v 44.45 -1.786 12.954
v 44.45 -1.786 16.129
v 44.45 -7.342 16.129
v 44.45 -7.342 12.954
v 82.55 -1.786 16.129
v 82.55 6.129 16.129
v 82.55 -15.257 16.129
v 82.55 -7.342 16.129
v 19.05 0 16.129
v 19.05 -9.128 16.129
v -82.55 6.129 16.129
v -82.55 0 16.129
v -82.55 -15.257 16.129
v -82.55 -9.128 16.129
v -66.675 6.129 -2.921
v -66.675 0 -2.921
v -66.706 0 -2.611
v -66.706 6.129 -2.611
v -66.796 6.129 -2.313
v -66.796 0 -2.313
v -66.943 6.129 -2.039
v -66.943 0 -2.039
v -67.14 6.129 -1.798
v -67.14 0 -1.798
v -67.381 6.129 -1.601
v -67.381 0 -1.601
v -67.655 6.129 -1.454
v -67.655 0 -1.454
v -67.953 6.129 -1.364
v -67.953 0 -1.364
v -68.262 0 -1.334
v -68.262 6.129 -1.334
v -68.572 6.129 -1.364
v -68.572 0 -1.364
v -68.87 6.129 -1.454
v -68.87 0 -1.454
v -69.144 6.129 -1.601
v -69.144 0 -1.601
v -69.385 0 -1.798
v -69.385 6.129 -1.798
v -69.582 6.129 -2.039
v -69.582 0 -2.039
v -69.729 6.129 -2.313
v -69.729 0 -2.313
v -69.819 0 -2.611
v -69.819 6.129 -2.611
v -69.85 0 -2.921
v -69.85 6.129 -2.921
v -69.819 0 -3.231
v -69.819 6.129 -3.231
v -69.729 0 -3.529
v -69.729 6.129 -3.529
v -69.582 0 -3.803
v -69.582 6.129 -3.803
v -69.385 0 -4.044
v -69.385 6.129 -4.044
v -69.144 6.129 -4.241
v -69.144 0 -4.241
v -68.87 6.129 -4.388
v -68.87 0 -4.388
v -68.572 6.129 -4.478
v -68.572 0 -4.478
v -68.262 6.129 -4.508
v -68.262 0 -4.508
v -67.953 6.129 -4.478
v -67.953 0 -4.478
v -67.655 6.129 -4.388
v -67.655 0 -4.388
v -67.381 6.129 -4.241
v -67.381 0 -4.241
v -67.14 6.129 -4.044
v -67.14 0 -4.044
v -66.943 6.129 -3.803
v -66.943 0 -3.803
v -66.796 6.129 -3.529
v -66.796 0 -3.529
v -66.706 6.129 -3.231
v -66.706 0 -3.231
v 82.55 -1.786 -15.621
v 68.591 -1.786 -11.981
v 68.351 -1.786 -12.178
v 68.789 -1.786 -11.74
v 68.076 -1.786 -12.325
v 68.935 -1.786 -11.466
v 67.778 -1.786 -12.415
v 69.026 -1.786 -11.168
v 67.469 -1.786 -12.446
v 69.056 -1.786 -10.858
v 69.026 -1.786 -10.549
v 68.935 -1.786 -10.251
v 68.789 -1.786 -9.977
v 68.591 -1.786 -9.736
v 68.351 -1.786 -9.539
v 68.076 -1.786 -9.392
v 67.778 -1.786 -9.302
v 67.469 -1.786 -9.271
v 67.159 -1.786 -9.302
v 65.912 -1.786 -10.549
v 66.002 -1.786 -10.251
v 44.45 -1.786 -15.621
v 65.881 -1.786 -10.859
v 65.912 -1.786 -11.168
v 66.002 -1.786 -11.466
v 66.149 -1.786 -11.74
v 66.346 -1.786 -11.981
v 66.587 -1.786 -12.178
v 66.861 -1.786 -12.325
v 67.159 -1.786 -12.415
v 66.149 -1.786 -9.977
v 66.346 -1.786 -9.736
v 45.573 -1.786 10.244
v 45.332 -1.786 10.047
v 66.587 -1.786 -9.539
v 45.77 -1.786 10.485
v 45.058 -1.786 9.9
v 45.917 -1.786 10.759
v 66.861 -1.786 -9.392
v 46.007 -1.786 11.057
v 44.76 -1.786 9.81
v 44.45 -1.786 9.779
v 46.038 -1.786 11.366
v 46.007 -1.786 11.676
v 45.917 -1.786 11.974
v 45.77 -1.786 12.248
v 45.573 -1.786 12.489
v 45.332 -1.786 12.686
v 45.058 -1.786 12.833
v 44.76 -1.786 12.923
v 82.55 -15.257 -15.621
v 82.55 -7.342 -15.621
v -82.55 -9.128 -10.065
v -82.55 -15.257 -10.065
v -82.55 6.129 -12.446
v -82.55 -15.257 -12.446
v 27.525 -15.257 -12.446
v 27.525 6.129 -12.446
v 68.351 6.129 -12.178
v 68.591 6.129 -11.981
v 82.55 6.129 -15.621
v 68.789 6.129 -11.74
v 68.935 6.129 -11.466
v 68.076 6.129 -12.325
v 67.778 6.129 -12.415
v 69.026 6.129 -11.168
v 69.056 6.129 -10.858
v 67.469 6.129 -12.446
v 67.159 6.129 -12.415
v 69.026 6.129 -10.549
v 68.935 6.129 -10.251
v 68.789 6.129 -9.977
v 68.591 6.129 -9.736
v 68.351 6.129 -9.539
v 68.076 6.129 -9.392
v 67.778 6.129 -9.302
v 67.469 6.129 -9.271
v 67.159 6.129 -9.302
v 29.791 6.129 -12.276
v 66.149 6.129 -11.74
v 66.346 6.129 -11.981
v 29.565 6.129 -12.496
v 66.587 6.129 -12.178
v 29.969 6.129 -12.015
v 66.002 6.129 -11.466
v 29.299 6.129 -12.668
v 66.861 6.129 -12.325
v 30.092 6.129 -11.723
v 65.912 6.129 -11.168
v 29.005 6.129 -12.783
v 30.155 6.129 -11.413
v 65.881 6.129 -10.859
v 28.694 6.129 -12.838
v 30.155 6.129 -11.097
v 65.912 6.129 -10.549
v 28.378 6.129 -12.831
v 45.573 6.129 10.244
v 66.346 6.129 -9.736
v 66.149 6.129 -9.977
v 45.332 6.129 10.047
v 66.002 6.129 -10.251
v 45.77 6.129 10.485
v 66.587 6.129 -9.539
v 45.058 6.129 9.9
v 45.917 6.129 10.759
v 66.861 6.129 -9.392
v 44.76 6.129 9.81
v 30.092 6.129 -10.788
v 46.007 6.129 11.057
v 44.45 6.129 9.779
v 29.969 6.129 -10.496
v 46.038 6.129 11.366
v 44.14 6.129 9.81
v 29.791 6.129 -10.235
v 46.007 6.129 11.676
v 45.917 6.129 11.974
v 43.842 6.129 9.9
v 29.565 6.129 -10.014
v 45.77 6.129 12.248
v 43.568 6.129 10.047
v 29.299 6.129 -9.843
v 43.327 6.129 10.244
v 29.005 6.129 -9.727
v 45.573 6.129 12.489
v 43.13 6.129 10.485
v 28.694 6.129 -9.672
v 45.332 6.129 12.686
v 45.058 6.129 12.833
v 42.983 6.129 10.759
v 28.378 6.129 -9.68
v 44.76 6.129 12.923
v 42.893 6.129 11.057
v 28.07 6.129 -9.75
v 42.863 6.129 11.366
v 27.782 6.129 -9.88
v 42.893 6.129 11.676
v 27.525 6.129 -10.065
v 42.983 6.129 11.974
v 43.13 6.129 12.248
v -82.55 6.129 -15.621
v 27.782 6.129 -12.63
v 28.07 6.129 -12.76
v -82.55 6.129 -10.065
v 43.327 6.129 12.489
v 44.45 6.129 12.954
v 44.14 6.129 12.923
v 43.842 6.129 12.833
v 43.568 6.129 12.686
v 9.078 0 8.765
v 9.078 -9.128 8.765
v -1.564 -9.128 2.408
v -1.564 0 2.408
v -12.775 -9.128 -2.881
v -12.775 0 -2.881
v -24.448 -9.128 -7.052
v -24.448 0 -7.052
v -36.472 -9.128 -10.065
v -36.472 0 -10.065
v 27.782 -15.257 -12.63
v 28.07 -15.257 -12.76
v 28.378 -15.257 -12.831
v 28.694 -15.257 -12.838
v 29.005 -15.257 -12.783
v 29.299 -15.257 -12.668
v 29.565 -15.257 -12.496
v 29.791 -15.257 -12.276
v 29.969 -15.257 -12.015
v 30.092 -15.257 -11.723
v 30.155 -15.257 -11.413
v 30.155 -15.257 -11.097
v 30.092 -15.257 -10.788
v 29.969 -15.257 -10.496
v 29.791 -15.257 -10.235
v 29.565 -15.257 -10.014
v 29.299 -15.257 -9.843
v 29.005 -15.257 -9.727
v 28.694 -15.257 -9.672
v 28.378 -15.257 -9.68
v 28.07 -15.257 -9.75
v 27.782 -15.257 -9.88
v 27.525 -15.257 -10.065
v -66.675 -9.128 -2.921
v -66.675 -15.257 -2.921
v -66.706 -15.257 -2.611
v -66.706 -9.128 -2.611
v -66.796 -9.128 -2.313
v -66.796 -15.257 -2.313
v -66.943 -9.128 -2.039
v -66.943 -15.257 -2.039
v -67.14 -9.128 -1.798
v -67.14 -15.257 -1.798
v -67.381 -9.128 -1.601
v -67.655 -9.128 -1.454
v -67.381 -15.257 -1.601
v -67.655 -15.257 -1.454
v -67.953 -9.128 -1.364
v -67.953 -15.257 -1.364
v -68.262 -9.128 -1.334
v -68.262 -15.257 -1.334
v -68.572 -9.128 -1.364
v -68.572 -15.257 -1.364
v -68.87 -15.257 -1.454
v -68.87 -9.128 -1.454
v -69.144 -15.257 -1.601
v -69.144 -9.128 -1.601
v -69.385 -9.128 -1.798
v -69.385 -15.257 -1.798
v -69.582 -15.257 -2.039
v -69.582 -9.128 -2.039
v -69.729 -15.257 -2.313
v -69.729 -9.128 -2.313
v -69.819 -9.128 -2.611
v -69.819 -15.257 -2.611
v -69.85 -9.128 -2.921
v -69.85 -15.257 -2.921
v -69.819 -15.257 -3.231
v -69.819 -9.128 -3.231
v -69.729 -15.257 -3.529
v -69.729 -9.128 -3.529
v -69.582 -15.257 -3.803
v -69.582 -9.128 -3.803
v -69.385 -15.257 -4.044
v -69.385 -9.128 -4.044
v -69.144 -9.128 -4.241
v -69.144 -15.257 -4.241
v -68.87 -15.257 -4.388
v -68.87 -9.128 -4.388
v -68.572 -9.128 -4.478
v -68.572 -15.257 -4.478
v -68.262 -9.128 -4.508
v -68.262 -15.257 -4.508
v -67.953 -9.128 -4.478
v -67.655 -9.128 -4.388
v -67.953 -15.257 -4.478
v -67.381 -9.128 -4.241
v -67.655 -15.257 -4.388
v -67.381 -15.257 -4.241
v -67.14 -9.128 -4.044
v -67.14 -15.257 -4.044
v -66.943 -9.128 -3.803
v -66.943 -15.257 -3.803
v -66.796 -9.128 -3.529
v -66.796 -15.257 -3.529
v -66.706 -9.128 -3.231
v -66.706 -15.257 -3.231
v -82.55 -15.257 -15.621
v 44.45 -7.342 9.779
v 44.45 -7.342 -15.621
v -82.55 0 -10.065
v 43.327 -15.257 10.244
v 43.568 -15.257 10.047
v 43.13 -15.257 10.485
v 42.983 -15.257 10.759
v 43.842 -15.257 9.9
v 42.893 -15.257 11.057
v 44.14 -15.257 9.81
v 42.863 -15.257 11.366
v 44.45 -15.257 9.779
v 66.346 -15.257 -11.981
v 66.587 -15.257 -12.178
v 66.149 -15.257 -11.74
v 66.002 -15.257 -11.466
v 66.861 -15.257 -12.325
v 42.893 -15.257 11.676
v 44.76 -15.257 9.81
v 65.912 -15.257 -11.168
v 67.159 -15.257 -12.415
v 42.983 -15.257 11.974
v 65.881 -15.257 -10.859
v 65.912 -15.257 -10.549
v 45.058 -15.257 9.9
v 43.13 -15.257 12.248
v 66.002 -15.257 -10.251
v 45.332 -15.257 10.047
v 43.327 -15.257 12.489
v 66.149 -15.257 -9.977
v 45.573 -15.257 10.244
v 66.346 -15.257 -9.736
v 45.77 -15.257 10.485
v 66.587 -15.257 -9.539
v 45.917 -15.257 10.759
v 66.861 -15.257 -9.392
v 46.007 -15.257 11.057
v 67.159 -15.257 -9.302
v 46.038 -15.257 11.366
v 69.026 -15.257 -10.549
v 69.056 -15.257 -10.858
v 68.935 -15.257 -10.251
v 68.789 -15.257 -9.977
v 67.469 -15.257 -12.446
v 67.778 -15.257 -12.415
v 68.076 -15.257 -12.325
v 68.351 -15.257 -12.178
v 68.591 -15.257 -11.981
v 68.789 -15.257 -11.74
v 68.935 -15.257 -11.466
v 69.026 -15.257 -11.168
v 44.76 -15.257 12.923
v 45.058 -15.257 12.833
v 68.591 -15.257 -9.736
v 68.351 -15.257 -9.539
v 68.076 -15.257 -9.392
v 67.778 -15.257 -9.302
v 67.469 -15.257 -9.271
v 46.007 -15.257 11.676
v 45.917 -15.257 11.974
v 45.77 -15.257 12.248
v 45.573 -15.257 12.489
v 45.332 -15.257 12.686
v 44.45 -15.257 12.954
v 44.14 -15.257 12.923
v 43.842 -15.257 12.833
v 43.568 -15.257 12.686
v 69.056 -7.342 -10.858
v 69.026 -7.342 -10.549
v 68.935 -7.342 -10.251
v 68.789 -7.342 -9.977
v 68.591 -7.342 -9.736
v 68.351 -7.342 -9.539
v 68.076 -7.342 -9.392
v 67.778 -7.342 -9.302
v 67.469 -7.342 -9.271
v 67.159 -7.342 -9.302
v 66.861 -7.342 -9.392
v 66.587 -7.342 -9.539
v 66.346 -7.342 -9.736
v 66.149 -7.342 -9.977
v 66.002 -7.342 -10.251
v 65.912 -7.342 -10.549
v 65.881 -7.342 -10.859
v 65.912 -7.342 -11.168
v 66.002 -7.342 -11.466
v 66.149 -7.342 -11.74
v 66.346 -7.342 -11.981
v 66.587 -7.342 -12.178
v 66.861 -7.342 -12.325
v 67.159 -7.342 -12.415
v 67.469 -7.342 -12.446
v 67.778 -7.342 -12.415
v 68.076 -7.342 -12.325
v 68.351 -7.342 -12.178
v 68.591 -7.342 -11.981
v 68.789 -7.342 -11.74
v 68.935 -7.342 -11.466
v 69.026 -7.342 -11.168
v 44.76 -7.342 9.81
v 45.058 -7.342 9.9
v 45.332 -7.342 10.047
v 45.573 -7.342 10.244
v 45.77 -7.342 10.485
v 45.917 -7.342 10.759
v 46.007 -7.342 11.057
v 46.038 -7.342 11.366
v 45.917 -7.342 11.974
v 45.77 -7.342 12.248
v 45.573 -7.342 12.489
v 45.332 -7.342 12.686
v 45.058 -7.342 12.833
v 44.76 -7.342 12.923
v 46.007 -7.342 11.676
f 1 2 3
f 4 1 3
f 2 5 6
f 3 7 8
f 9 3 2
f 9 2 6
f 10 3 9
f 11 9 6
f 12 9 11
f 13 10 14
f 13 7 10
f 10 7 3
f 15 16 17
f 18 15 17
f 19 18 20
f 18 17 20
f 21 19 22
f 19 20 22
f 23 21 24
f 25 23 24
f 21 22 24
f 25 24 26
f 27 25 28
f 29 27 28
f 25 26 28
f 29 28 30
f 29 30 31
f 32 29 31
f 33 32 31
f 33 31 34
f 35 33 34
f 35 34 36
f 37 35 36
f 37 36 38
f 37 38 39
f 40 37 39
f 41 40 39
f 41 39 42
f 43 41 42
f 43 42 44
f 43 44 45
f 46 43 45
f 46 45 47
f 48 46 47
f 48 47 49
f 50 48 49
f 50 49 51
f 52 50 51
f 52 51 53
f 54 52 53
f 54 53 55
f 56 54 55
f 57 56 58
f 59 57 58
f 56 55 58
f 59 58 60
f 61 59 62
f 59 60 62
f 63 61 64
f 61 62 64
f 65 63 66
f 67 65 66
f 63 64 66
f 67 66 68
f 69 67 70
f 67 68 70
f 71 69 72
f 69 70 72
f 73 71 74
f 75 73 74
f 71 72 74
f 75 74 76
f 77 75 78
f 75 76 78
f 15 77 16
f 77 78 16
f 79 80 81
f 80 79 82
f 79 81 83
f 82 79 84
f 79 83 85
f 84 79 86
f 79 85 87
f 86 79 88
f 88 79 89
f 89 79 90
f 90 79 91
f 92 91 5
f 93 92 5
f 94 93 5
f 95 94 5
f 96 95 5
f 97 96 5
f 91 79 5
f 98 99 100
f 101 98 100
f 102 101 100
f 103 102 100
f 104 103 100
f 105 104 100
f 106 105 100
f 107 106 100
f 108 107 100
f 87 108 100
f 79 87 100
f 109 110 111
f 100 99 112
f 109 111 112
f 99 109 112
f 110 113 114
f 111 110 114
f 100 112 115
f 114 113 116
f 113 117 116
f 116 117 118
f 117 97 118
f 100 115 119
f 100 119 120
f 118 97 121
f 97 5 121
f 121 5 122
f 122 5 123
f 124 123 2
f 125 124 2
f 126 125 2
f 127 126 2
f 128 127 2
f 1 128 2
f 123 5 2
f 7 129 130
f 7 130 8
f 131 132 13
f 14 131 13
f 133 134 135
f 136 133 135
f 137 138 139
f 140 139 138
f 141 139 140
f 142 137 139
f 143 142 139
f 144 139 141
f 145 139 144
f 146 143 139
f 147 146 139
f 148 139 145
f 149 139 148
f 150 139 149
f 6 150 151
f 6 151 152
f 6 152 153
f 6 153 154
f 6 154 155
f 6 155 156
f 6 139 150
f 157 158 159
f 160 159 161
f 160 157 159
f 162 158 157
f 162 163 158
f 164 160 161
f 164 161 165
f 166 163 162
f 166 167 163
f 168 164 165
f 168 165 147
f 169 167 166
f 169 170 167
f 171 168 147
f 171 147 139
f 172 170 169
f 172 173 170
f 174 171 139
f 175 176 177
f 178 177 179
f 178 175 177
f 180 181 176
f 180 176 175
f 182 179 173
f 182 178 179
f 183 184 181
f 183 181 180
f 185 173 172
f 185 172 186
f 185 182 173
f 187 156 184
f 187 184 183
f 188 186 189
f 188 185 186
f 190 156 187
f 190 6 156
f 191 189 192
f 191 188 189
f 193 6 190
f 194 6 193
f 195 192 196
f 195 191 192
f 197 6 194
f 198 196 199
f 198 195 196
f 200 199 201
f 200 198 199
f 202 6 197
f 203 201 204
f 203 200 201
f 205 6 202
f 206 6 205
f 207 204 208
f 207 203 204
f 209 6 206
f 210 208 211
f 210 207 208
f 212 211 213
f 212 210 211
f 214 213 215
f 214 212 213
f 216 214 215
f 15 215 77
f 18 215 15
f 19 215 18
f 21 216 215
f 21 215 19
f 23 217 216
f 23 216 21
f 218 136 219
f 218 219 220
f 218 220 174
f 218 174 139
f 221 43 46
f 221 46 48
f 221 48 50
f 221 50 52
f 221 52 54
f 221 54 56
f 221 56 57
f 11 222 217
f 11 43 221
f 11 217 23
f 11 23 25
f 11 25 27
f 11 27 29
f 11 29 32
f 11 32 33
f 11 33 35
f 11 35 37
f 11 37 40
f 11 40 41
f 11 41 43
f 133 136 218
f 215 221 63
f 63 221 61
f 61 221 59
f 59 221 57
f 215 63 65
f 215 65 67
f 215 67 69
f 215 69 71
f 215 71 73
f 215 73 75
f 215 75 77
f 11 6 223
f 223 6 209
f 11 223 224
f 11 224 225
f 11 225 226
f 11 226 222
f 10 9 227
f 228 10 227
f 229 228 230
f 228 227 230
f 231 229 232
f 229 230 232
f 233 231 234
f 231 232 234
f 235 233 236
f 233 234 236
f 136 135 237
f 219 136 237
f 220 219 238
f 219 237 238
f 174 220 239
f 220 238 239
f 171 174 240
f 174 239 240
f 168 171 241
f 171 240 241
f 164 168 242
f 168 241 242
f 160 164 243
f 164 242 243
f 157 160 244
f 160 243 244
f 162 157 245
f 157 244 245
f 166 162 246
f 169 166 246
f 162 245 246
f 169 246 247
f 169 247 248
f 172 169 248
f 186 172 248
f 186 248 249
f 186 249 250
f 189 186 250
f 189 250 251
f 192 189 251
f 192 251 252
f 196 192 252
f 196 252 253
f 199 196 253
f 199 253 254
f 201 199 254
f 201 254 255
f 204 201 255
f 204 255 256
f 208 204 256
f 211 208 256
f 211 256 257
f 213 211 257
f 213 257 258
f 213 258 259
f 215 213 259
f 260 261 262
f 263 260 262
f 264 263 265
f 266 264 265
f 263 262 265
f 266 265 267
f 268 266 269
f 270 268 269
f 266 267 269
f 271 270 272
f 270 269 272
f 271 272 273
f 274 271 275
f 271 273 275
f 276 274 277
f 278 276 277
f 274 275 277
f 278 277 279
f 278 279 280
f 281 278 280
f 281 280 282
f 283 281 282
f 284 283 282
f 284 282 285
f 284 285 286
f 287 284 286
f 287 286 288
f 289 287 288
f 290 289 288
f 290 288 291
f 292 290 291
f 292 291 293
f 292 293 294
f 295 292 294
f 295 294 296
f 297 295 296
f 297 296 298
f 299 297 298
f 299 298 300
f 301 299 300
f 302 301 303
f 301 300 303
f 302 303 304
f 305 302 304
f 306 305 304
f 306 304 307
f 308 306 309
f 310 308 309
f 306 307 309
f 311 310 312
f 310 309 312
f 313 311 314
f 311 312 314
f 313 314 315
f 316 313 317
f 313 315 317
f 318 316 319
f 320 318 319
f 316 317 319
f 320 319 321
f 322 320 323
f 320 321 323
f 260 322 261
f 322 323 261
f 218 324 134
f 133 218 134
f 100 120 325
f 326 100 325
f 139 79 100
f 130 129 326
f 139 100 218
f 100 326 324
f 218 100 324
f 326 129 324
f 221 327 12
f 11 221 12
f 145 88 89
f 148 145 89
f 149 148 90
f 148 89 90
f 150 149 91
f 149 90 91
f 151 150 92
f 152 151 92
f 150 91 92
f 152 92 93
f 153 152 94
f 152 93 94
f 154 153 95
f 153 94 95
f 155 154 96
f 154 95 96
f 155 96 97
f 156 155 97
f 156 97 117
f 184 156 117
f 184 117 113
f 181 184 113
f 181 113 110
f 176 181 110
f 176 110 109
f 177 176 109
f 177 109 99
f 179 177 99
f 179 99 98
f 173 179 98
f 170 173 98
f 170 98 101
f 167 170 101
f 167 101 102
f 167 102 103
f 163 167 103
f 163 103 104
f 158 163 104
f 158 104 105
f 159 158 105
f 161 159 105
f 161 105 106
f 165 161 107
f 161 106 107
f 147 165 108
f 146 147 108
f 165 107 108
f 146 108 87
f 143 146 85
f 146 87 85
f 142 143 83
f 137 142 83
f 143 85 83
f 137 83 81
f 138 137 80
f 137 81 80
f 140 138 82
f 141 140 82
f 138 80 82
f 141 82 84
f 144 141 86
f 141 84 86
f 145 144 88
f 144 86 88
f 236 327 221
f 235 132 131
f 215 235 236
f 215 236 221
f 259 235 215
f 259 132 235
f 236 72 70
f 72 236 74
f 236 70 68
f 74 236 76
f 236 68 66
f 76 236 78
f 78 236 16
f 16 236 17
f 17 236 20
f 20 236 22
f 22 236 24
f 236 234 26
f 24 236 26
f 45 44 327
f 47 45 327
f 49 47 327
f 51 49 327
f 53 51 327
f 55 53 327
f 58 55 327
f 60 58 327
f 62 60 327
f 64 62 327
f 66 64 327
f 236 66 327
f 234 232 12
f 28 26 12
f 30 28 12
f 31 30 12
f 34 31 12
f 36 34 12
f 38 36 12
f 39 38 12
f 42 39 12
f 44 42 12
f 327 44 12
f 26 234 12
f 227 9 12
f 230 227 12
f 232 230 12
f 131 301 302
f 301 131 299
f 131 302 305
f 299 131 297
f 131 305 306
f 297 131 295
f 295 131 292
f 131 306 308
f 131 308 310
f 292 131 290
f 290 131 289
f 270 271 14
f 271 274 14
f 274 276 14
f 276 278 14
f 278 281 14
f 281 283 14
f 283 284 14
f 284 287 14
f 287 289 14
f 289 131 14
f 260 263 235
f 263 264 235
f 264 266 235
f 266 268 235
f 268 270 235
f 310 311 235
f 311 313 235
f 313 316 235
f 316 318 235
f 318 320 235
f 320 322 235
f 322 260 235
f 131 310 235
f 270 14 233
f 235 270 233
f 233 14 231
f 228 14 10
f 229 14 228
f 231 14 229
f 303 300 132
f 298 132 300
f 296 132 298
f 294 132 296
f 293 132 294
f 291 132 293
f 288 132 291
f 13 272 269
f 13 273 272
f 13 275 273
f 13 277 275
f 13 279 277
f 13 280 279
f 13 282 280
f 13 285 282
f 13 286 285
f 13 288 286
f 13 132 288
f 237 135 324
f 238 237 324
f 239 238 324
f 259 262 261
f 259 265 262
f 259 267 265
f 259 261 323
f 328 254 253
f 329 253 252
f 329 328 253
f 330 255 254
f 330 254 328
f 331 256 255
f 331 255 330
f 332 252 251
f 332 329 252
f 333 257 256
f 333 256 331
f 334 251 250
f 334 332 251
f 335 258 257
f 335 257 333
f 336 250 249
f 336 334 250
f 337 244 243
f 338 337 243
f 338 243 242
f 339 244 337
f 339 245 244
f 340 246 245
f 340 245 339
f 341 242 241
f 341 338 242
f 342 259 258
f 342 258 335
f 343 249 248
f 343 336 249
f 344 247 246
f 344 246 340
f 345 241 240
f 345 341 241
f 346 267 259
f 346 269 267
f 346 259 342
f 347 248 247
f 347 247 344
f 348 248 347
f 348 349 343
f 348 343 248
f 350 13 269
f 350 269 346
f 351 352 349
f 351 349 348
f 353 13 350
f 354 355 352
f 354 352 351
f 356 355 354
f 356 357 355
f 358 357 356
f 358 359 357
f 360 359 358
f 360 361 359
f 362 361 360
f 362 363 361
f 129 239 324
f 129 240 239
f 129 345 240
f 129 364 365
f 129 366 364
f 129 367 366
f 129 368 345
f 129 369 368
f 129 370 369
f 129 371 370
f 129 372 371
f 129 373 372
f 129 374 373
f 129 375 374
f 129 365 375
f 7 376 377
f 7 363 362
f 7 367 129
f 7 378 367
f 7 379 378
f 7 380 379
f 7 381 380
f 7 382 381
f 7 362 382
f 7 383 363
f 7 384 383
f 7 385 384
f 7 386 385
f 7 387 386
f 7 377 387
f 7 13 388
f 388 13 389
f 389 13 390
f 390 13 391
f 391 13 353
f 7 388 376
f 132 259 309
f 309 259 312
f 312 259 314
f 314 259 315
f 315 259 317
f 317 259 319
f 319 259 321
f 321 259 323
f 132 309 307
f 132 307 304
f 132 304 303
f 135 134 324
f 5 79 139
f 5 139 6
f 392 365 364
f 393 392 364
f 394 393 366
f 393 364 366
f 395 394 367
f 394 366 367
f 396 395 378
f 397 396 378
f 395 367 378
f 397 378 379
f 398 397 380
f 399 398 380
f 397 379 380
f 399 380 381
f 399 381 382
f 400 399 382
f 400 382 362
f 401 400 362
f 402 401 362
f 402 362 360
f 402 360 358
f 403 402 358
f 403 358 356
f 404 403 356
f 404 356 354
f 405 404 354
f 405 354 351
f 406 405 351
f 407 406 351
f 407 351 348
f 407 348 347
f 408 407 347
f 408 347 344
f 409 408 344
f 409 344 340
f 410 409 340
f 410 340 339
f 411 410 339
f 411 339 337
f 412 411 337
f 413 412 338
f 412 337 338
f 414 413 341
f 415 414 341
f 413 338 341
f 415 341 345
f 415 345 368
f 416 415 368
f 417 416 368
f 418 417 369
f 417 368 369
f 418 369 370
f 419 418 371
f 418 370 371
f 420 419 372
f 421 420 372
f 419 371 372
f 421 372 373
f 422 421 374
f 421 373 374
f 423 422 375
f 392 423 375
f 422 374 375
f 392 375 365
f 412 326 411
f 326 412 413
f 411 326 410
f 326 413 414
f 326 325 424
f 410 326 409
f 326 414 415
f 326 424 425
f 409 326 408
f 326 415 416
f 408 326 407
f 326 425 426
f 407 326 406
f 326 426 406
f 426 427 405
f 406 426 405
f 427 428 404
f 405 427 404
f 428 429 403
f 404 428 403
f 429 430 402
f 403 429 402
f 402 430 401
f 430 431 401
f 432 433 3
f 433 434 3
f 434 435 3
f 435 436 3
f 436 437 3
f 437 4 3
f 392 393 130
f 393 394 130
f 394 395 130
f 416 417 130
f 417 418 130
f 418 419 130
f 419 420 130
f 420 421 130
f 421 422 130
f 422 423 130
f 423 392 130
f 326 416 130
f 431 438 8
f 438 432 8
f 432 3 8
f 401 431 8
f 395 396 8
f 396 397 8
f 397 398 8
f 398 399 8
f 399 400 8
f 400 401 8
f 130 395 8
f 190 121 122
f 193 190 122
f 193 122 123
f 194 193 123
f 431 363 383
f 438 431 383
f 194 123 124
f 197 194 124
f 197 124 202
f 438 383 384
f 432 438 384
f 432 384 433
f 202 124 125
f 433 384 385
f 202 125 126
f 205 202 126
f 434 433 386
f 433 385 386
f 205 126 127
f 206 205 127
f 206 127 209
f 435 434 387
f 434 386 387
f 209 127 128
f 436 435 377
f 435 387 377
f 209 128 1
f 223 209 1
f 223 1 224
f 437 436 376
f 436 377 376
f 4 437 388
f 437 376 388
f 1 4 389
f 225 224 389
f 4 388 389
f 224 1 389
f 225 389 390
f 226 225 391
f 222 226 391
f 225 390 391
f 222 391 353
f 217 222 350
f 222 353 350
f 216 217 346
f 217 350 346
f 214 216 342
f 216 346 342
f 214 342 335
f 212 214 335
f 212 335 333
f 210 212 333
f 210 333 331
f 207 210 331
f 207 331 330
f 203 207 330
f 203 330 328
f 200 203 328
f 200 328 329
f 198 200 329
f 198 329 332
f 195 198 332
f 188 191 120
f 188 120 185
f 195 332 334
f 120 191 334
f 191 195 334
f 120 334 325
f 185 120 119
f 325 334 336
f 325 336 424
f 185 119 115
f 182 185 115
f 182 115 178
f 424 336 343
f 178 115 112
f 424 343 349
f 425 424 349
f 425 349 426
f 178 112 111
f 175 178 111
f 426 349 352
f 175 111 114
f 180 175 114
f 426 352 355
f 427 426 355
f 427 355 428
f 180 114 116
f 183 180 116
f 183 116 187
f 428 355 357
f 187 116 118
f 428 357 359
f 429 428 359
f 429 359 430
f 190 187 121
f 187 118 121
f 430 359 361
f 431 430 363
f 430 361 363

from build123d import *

# Parameters (mm, degrees)
F1_DEPTH  = 9.128125
F2_W      = 165.1
F2_H      = 31.75
F3_DEPTH  = 6.1293375
F4_W      = 165.1
F4_H      = 31.75
F5_DEPTH  = 6.1293375
F6_W      = 111.125
F6_H      = 2.38125
F7_DEPTH  = 21.3868
F8_R      = 1.5875
F9_DEPTH  = 21.3868
F11_DEPTH = 31.75


with BuildPart() as f1:
    # F0 (on Front) → F1 (new body)
    with BuildSketch(Plane.XZ):
        with BuildLine():
            Line((-57.15, -12.446), (-82.55, -12.446))
            Line((-82.55, -12.446), (-82.55, -15.621))
            Line((-82.55, -15.621), (82.55, -15.621))
            Line((82.55, -15.621), (82.55, 16.129))
            Line((82.55, 16.129), (19.05, 16.129))
            ThreePointArc((19.05, 16.129), (-16.6991764887, -4.4273626968), (-57.15, -12.446))
        make_face()
    extrude(amount=F1_DEPTH)

    # F2 (on face) → F3 (join)
    with BuildSketch(Plane.XZ.offset(9.128125)):
        with Locations((0, 0.254)):
            Rectangle(F2_W, F2_H)
    extrude(amount=F3_DEPTH)

    # F4 (on face) → F5 (join)
    with BuildSketch(Plane(origin=(0, 0, 0), x_dir=(-1, 0, 0), z_dir=(0, 1, 0))):
        with Locations((0, 0.254)):
            Rectangle(F4_W, F4_H)
    extrude(amount=F5_DEPTH)

    # F6 (on face) → F7 (cut, through all)
    with BuildSketch(Plane.XZ.offset(15.2574625)):
        with Locations((-26.9875, -11.255375)):
            Rectangle(F6_W, F6_H)
    extrude(amount=-F7_DEPTH, mode=Mode.SUBTRACT)

    # F8 (on face) → F9 (cut, through all)
    with BuildSketch(Plane.XZ.offset(15.2574625)):
        with Locations((-68.2625, -2.921)):
            Circle(F8_R)
        with Locations((28.575, -11.255375)):
            Circle(F8_R)
        with Locations((44.45, 11.3665)):
            Circle(F8_R)
        with Locations((67.46875, -10.8585)):
            Circle(F8_R)
    extrude(amount=-F9_DEPTH, mode=Mode.SUBTRACT)

    # F10 (on face) → F11 (cut, through all)
    with BuildSketch(Plane.XY.offset(16.129)):
        Polygon((82.55, -7.3421875), (82.55, -1.7859375), (44.45, -1.7859375), (44.45, -7.3421875), align=None)
    extrude(amount=-F11_DEPTH, mode=Mode.SUBTRACT)


solid = f1.part
